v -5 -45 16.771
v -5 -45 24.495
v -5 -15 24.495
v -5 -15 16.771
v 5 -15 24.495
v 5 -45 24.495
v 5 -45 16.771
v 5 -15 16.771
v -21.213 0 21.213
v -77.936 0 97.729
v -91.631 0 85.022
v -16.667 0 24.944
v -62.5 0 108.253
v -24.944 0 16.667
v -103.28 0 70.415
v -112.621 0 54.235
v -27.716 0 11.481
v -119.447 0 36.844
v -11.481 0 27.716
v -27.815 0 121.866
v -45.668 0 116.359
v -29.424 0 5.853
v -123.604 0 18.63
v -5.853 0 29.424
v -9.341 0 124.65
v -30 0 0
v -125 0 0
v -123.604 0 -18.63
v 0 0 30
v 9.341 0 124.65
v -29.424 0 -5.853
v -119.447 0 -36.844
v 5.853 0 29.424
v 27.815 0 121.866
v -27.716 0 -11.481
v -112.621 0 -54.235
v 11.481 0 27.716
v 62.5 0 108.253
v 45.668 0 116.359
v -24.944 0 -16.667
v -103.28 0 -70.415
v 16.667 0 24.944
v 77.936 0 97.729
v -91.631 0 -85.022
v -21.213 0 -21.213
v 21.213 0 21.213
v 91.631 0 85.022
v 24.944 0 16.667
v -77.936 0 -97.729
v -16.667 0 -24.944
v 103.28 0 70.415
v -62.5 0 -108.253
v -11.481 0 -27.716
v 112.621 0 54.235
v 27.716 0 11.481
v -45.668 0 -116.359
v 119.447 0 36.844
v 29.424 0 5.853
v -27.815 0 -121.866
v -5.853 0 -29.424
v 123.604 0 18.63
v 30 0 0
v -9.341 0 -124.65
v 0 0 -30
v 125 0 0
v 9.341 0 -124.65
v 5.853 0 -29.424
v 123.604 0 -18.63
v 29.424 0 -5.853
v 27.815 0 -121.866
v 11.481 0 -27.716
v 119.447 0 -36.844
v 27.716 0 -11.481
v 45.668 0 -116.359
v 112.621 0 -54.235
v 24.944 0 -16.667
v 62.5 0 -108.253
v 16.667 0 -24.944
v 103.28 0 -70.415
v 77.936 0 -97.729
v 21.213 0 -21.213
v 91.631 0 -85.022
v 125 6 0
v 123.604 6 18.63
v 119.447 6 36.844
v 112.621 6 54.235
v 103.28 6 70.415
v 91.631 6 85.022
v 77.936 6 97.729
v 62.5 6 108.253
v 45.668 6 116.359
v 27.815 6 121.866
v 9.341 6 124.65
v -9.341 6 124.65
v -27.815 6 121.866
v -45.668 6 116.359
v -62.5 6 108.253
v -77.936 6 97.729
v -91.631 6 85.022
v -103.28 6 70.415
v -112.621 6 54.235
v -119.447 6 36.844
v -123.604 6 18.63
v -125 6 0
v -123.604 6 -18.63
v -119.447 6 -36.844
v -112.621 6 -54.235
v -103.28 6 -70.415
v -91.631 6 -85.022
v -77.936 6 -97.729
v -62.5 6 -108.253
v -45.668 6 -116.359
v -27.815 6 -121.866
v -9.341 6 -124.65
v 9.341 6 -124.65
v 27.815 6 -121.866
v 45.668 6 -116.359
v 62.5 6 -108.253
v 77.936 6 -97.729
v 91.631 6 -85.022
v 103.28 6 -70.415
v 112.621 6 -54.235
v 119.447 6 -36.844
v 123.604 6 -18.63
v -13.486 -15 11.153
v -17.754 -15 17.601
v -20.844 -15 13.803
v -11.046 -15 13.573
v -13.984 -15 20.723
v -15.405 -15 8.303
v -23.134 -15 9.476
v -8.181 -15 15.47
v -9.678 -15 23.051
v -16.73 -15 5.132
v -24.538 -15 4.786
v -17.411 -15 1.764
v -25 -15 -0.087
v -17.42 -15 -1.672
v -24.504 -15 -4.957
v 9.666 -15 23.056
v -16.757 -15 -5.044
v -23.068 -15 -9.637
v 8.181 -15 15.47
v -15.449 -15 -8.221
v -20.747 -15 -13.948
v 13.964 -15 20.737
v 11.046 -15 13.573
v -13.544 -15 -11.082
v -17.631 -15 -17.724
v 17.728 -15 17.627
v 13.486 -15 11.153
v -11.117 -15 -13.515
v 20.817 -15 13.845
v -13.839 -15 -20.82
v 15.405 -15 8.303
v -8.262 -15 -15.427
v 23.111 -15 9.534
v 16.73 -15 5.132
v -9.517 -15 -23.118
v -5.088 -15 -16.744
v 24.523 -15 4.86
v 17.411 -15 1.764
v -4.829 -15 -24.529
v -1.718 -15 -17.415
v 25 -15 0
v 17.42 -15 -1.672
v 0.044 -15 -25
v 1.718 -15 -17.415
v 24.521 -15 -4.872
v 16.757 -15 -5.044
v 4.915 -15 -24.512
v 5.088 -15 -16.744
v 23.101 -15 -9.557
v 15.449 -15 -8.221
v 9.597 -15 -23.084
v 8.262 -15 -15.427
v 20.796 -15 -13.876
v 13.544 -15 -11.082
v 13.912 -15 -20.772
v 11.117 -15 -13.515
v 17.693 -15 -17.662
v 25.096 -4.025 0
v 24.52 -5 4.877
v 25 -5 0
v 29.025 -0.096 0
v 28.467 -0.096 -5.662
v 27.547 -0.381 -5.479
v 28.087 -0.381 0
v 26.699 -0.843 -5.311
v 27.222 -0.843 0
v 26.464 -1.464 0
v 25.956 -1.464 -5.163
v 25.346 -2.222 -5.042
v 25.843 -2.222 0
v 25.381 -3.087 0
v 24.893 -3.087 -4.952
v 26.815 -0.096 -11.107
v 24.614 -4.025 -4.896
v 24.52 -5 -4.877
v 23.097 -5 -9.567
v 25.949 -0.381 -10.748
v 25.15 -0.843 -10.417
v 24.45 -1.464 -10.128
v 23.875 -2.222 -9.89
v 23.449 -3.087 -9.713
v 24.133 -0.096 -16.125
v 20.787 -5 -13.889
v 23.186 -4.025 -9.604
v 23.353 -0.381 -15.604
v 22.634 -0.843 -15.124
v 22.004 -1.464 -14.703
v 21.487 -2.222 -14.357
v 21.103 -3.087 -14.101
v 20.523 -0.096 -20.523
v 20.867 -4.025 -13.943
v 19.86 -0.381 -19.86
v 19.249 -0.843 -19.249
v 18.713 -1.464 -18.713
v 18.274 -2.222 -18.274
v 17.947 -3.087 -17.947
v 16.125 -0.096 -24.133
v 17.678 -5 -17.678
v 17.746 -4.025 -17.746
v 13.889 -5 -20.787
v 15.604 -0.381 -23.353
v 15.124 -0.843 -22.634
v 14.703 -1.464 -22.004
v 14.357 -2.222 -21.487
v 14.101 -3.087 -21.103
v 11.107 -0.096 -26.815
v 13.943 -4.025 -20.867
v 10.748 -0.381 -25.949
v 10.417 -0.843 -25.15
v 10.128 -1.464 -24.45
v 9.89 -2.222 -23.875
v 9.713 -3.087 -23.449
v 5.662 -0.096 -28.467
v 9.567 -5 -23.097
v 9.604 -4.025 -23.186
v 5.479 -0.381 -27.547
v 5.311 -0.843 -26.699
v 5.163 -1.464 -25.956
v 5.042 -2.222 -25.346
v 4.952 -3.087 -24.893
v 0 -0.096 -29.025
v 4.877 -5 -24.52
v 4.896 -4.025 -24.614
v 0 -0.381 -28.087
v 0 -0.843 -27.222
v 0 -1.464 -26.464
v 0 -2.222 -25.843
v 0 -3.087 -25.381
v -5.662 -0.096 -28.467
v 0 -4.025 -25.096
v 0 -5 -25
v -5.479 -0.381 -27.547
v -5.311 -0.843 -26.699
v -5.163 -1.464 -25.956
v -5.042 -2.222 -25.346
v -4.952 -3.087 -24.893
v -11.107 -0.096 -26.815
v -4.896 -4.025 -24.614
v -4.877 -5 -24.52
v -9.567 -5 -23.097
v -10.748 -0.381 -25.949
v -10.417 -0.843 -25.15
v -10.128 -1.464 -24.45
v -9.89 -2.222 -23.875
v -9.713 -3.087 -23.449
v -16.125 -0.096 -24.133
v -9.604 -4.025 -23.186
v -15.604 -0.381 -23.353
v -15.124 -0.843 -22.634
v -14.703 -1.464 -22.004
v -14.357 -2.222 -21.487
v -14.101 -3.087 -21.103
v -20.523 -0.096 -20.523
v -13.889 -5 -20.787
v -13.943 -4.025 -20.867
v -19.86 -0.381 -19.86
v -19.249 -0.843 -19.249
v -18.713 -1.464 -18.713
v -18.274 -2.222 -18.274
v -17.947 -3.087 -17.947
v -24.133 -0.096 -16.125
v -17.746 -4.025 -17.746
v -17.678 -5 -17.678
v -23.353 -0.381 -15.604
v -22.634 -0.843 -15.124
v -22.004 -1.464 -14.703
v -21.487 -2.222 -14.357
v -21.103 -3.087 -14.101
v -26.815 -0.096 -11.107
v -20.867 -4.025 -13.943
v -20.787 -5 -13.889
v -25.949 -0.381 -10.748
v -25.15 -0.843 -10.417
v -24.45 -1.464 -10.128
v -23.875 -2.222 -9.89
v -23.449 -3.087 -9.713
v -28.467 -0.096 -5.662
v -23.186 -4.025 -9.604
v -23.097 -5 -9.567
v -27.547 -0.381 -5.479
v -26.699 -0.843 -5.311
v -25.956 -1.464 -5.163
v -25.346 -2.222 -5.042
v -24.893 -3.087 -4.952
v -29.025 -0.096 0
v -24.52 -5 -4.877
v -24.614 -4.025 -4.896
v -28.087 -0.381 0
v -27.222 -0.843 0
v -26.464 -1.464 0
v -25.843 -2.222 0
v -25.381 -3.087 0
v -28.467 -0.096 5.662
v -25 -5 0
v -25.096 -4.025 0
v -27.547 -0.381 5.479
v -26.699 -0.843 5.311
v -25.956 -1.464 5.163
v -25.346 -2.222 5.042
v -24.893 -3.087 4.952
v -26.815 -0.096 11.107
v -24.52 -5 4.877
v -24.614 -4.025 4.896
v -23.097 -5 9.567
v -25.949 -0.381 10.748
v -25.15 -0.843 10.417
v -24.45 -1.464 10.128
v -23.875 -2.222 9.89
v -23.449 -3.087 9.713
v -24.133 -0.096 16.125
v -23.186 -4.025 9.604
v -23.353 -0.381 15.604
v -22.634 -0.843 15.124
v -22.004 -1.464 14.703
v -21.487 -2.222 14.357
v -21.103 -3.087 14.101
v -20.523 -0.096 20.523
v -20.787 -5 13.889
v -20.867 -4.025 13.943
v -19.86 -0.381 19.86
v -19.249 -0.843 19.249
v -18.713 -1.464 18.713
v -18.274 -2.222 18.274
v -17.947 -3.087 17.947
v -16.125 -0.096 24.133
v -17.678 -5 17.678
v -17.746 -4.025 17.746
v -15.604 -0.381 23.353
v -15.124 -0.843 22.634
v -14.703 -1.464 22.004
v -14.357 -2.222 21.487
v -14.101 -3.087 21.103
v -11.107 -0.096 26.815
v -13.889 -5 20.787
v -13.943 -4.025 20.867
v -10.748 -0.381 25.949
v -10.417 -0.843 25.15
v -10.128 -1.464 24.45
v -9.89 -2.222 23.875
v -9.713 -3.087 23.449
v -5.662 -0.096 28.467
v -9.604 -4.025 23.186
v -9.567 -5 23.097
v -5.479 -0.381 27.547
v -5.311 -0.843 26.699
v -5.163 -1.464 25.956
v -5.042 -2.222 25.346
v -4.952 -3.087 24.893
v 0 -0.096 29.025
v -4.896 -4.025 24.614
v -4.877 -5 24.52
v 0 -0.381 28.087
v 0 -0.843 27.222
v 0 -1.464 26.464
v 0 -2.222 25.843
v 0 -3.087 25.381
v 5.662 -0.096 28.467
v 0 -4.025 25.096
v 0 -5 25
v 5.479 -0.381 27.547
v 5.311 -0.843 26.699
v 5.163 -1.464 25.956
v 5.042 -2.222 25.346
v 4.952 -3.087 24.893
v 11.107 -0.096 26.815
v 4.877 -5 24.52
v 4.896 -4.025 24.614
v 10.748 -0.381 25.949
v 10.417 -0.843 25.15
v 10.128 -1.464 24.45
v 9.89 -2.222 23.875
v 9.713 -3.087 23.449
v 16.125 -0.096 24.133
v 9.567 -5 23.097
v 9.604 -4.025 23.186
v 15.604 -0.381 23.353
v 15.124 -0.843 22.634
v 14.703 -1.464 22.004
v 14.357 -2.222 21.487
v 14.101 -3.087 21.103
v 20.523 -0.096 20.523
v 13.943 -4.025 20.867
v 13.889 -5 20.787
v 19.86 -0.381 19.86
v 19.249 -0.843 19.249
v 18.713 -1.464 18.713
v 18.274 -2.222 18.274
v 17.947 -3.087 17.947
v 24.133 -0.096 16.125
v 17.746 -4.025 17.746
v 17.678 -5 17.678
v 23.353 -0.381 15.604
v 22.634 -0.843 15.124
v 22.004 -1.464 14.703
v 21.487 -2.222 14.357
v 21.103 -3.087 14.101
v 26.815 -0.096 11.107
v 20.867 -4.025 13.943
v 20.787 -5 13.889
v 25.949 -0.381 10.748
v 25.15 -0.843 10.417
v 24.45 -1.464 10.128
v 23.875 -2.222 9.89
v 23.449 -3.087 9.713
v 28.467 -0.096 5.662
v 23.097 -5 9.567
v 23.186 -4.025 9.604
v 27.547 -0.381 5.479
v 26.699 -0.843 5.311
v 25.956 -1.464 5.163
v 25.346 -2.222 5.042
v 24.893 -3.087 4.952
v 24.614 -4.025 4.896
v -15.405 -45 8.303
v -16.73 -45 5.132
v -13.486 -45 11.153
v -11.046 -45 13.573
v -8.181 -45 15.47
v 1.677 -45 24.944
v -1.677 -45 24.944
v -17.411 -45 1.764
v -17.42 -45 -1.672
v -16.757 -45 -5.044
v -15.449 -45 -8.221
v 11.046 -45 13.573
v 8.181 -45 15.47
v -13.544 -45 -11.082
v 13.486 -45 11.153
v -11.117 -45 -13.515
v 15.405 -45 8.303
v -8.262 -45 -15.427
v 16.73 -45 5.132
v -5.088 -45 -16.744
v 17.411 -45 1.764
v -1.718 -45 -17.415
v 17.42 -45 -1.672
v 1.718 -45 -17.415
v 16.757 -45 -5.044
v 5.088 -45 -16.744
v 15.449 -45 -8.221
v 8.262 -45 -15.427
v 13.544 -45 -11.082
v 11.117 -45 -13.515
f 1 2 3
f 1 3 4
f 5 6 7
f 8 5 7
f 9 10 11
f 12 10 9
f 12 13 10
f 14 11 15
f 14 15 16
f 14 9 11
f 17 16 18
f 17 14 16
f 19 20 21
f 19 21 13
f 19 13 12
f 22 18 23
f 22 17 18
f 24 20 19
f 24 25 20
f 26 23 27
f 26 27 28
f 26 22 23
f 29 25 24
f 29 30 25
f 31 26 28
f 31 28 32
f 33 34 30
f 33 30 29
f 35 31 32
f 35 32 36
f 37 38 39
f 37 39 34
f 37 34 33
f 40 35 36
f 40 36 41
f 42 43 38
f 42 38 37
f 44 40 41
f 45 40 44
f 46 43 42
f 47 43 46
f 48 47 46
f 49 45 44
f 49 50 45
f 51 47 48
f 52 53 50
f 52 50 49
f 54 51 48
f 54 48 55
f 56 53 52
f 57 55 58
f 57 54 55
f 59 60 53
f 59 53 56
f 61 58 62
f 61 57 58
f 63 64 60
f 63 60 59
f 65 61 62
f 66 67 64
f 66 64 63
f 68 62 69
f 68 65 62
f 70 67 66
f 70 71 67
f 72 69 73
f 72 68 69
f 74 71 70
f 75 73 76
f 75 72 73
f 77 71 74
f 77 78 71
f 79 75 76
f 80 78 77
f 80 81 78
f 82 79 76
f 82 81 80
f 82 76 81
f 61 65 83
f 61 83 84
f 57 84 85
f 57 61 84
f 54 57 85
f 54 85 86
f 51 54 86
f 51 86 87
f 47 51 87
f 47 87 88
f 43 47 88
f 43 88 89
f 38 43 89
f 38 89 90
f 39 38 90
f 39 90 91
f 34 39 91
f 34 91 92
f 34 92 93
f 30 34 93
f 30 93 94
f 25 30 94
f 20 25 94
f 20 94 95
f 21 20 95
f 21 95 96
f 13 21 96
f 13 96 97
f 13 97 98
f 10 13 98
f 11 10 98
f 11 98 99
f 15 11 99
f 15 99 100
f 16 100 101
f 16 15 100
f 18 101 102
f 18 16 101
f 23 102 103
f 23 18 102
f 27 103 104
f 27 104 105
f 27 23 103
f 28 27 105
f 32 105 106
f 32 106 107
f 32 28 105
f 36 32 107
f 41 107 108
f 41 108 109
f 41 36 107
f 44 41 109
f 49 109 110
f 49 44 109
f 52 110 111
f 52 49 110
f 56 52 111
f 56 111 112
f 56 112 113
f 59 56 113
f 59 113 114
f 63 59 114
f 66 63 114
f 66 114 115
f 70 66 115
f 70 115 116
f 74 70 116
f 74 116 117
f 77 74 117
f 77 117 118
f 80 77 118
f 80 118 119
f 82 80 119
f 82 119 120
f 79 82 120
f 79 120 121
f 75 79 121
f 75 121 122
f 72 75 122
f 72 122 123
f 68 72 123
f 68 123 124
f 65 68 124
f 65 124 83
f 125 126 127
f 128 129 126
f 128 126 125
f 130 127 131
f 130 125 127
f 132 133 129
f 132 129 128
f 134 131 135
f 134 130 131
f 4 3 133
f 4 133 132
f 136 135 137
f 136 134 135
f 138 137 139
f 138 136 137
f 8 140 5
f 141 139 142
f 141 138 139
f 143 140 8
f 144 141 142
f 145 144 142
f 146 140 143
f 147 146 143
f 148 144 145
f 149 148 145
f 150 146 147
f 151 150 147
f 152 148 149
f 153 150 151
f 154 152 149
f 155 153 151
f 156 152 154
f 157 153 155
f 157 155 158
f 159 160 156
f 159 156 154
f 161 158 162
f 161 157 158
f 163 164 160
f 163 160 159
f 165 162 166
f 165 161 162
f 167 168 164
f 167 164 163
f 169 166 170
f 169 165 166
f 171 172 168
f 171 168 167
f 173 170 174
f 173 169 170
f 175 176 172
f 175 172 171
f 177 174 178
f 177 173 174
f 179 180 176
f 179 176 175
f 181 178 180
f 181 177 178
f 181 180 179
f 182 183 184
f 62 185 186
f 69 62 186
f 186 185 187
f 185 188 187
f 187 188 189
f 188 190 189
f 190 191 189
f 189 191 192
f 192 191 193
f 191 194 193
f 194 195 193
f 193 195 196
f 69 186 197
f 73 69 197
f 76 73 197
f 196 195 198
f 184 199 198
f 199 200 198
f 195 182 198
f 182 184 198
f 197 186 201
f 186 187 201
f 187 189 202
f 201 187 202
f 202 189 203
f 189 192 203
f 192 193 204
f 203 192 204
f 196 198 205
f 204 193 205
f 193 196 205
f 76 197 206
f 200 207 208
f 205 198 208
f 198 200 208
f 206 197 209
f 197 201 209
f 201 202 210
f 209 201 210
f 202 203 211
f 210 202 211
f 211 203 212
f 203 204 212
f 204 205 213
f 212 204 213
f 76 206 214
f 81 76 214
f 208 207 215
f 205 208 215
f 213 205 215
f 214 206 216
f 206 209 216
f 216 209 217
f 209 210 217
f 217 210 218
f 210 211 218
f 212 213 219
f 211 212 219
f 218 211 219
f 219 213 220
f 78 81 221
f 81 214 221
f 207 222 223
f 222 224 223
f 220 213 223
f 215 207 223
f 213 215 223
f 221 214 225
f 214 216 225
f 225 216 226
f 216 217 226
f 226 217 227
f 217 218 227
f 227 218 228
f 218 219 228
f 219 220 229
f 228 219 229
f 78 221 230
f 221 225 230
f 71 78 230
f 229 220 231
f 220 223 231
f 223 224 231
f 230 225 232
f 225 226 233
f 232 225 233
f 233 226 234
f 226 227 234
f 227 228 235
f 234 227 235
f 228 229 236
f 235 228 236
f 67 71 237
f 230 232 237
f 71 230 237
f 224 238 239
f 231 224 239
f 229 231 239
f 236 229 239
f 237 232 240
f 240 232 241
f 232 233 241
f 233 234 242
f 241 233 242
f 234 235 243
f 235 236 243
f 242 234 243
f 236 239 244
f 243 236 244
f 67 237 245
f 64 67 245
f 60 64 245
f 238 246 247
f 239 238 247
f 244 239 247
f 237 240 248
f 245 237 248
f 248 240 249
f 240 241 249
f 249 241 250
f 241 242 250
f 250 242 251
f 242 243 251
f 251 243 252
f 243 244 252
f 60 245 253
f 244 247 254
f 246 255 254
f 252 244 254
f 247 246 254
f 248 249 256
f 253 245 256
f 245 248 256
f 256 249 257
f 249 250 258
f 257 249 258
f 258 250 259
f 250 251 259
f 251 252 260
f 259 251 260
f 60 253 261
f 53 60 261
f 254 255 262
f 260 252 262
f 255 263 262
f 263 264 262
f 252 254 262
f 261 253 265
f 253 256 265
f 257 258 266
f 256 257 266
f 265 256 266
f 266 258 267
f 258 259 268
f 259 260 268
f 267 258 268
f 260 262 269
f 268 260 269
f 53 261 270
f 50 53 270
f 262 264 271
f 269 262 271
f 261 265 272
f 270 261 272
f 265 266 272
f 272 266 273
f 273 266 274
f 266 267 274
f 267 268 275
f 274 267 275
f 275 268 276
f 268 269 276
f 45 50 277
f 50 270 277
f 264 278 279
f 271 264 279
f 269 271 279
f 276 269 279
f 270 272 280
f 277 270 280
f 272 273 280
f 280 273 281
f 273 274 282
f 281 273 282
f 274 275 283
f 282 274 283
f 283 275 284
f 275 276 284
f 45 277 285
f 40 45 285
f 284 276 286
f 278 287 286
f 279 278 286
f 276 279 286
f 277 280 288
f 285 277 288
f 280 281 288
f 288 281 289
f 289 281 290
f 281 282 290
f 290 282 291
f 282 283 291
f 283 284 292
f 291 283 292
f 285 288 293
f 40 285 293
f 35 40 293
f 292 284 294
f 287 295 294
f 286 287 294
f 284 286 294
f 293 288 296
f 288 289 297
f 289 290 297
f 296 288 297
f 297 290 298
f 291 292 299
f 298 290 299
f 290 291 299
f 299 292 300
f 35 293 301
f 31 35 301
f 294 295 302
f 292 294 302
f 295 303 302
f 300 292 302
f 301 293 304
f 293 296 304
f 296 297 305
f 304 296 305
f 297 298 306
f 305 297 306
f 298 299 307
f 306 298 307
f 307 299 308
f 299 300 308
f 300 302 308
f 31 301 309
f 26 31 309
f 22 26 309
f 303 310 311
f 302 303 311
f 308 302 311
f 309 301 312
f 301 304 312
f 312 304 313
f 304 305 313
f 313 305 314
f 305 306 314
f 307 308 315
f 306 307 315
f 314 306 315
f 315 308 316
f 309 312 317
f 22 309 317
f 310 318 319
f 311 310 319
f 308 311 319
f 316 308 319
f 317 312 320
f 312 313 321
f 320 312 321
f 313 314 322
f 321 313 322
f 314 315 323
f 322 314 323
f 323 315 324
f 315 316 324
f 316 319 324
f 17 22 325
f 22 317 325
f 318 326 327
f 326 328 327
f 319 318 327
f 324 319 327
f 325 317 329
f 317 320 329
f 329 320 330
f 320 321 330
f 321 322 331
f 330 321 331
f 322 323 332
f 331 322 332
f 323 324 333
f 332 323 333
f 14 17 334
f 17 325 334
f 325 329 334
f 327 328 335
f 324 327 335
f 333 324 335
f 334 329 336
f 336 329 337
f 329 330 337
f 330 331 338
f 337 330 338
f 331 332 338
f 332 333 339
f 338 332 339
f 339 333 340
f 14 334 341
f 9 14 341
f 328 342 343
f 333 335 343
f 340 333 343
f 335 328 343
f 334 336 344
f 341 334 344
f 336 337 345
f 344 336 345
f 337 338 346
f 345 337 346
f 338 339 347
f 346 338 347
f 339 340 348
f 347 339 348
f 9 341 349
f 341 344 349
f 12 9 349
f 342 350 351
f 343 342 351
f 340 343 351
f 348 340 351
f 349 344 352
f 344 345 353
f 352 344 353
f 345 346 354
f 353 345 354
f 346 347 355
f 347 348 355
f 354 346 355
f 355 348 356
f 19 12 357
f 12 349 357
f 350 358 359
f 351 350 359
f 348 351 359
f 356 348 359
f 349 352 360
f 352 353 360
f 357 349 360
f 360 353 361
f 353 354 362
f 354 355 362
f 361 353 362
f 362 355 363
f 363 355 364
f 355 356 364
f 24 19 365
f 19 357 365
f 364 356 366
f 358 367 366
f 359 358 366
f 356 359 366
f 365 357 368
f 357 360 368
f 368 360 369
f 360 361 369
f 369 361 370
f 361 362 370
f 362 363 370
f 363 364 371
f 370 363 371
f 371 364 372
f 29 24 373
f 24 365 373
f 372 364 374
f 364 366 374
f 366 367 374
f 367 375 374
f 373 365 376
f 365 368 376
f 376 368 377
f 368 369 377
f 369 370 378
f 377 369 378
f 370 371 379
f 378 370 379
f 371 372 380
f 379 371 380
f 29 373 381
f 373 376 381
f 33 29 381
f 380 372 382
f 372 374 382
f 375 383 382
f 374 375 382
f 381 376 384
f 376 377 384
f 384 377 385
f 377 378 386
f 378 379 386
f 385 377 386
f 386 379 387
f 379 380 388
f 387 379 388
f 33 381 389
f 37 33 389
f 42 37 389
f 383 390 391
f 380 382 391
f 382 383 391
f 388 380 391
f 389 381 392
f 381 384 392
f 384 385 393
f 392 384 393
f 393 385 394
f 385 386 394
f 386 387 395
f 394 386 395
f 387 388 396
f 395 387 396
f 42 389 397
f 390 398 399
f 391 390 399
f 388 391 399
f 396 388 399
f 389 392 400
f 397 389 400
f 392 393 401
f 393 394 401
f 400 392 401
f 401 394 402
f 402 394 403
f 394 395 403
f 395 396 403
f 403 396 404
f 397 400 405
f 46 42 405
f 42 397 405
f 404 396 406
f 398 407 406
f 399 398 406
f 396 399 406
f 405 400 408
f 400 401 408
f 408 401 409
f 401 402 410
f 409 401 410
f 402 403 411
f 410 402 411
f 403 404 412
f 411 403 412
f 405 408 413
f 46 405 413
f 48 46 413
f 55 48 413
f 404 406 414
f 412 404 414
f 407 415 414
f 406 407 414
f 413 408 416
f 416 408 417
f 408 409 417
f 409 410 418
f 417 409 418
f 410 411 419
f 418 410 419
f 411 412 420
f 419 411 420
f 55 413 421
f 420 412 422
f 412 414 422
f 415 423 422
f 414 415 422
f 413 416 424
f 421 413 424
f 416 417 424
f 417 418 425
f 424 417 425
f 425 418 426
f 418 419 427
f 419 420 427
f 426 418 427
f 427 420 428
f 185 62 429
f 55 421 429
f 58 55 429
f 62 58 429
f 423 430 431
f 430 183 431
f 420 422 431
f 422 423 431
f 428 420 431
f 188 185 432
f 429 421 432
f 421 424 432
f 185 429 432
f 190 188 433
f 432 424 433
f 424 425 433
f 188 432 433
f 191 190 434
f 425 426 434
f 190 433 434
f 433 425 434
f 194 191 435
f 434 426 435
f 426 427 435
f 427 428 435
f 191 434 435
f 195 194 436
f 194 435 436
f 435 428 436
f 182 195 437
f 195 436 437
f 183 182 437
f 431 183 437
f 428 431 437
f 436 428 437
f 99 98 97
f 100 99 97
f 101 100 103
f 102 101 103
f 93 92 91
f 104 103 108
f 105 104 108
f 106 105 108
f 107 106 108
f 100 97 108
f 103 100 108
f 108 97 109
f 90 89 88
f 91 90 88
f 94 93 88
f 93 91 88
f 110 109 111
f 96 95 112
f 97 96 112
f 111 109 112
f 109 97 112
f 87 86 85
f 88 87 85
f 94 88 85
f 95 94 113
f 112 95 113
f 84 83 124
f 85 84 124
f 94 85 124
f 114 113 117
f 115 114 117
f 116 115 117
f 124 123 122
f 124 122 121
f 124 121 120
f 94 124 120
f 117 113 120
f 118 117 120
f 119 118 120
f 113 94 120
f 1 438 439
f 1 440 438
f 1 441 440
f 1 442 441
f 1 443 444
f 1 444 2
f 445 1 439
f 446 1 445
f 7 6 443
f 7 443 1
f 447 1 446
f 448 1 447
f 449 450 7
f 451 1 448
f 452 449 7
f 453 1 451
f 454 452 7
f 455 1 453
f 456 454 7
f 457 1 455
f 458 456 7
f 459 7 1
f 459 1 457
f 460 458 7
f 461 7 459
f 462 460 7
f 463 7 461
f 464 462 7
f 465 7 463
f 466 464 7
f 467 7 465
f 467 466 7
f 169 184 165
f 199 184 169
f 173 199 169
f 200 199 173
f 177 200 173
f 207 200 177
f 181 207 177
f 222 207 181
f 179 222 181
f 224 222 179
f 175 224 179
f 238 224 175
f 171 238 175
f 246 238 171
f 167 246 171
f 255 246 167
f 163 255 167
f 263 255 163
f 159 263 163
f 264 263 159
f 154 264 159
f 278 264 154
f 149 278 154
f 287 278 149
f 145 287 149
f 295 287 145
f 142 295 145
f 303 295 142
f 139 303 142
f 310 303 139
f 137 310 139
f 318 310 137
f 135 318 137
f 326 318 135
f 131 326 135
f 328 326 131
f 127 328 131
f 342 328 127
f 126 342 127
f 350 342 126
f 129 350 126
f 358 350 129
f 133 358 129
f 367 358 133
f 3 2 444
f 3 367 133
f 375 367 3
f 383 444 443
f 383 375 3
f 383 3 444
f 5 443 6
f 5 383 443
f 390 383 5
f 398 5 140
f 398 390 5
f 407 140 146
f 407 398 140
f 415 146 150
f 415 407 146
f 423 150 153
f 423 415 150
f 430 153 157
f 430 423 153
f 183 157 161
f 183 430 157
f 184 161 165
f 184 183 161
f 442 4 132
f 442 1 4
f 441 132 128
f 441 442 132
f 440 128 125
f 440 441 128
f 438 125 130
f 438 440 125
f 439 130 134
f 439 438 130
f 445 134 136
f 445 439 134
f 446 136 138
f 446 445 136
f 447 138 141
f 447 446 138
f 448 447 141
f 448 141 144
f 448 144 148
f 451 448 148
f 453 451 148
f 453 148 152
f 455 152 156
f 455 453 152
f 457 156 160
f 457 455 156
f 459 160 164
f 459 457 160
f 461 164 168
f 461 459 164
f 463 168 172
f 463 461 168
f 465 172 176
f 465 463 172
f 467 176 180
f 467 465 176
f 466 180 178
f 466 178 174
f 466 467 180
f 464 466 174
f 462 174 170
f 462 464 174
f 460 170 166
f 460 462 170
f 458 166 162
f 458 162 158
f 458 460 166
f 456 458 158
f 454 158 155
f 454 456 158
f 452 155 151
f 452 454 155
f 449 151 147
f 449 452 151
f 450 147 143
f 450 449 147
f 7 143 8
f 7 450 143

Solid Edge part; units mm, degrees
sketch "Sketch1" plane through (0, 0, 0) normal (0, -1, 0) x (1, 0, 0)
  circle A0 centre (0, 0) radius 125
extrude "Protrusion1" add sketch "Sketch1" against normal blind 6
sketch "Sketch2" plane through (0, 0, 0) normal (0, -1, 0) x (1, 0, 0)
  circle A0 centre (0, 0) radius 25
extrude "ProtrusiónExtruida_2" add sketch "Sketch2" along normal blind 45
sketch "Sketch3" plane through (0, -45, 0) normal (0, -1, 0) x (1, 0, 0)
  line L0 (-5, 24.4949) -> (-5, 16.7705)
  line L1 (5, 24.4949) -> (5, 16.7705)
  arc A0 (5, 24.4949) -> (-5, 24.4949) centre (0, 0) cw
  arc A1 (5, 16.7705) -> (-5, 16.7705) centre (0, 0) cw
extrude "Cutout1" cut sketch "Sketch3" against normal up to surface (45 mm away)
sketch "Sketch4" plane through (0, 0, 0) normal (0, -1, 0) x (1, 0, 0)
  circle A0 centre (0, 0) radius 25
extrude "ProtrusiónExtruida_3" add sketch "Sketch4" along normal blind 15
fillet "Redondeo_1" radius 5 1 edges at (-25, 0, 0)
